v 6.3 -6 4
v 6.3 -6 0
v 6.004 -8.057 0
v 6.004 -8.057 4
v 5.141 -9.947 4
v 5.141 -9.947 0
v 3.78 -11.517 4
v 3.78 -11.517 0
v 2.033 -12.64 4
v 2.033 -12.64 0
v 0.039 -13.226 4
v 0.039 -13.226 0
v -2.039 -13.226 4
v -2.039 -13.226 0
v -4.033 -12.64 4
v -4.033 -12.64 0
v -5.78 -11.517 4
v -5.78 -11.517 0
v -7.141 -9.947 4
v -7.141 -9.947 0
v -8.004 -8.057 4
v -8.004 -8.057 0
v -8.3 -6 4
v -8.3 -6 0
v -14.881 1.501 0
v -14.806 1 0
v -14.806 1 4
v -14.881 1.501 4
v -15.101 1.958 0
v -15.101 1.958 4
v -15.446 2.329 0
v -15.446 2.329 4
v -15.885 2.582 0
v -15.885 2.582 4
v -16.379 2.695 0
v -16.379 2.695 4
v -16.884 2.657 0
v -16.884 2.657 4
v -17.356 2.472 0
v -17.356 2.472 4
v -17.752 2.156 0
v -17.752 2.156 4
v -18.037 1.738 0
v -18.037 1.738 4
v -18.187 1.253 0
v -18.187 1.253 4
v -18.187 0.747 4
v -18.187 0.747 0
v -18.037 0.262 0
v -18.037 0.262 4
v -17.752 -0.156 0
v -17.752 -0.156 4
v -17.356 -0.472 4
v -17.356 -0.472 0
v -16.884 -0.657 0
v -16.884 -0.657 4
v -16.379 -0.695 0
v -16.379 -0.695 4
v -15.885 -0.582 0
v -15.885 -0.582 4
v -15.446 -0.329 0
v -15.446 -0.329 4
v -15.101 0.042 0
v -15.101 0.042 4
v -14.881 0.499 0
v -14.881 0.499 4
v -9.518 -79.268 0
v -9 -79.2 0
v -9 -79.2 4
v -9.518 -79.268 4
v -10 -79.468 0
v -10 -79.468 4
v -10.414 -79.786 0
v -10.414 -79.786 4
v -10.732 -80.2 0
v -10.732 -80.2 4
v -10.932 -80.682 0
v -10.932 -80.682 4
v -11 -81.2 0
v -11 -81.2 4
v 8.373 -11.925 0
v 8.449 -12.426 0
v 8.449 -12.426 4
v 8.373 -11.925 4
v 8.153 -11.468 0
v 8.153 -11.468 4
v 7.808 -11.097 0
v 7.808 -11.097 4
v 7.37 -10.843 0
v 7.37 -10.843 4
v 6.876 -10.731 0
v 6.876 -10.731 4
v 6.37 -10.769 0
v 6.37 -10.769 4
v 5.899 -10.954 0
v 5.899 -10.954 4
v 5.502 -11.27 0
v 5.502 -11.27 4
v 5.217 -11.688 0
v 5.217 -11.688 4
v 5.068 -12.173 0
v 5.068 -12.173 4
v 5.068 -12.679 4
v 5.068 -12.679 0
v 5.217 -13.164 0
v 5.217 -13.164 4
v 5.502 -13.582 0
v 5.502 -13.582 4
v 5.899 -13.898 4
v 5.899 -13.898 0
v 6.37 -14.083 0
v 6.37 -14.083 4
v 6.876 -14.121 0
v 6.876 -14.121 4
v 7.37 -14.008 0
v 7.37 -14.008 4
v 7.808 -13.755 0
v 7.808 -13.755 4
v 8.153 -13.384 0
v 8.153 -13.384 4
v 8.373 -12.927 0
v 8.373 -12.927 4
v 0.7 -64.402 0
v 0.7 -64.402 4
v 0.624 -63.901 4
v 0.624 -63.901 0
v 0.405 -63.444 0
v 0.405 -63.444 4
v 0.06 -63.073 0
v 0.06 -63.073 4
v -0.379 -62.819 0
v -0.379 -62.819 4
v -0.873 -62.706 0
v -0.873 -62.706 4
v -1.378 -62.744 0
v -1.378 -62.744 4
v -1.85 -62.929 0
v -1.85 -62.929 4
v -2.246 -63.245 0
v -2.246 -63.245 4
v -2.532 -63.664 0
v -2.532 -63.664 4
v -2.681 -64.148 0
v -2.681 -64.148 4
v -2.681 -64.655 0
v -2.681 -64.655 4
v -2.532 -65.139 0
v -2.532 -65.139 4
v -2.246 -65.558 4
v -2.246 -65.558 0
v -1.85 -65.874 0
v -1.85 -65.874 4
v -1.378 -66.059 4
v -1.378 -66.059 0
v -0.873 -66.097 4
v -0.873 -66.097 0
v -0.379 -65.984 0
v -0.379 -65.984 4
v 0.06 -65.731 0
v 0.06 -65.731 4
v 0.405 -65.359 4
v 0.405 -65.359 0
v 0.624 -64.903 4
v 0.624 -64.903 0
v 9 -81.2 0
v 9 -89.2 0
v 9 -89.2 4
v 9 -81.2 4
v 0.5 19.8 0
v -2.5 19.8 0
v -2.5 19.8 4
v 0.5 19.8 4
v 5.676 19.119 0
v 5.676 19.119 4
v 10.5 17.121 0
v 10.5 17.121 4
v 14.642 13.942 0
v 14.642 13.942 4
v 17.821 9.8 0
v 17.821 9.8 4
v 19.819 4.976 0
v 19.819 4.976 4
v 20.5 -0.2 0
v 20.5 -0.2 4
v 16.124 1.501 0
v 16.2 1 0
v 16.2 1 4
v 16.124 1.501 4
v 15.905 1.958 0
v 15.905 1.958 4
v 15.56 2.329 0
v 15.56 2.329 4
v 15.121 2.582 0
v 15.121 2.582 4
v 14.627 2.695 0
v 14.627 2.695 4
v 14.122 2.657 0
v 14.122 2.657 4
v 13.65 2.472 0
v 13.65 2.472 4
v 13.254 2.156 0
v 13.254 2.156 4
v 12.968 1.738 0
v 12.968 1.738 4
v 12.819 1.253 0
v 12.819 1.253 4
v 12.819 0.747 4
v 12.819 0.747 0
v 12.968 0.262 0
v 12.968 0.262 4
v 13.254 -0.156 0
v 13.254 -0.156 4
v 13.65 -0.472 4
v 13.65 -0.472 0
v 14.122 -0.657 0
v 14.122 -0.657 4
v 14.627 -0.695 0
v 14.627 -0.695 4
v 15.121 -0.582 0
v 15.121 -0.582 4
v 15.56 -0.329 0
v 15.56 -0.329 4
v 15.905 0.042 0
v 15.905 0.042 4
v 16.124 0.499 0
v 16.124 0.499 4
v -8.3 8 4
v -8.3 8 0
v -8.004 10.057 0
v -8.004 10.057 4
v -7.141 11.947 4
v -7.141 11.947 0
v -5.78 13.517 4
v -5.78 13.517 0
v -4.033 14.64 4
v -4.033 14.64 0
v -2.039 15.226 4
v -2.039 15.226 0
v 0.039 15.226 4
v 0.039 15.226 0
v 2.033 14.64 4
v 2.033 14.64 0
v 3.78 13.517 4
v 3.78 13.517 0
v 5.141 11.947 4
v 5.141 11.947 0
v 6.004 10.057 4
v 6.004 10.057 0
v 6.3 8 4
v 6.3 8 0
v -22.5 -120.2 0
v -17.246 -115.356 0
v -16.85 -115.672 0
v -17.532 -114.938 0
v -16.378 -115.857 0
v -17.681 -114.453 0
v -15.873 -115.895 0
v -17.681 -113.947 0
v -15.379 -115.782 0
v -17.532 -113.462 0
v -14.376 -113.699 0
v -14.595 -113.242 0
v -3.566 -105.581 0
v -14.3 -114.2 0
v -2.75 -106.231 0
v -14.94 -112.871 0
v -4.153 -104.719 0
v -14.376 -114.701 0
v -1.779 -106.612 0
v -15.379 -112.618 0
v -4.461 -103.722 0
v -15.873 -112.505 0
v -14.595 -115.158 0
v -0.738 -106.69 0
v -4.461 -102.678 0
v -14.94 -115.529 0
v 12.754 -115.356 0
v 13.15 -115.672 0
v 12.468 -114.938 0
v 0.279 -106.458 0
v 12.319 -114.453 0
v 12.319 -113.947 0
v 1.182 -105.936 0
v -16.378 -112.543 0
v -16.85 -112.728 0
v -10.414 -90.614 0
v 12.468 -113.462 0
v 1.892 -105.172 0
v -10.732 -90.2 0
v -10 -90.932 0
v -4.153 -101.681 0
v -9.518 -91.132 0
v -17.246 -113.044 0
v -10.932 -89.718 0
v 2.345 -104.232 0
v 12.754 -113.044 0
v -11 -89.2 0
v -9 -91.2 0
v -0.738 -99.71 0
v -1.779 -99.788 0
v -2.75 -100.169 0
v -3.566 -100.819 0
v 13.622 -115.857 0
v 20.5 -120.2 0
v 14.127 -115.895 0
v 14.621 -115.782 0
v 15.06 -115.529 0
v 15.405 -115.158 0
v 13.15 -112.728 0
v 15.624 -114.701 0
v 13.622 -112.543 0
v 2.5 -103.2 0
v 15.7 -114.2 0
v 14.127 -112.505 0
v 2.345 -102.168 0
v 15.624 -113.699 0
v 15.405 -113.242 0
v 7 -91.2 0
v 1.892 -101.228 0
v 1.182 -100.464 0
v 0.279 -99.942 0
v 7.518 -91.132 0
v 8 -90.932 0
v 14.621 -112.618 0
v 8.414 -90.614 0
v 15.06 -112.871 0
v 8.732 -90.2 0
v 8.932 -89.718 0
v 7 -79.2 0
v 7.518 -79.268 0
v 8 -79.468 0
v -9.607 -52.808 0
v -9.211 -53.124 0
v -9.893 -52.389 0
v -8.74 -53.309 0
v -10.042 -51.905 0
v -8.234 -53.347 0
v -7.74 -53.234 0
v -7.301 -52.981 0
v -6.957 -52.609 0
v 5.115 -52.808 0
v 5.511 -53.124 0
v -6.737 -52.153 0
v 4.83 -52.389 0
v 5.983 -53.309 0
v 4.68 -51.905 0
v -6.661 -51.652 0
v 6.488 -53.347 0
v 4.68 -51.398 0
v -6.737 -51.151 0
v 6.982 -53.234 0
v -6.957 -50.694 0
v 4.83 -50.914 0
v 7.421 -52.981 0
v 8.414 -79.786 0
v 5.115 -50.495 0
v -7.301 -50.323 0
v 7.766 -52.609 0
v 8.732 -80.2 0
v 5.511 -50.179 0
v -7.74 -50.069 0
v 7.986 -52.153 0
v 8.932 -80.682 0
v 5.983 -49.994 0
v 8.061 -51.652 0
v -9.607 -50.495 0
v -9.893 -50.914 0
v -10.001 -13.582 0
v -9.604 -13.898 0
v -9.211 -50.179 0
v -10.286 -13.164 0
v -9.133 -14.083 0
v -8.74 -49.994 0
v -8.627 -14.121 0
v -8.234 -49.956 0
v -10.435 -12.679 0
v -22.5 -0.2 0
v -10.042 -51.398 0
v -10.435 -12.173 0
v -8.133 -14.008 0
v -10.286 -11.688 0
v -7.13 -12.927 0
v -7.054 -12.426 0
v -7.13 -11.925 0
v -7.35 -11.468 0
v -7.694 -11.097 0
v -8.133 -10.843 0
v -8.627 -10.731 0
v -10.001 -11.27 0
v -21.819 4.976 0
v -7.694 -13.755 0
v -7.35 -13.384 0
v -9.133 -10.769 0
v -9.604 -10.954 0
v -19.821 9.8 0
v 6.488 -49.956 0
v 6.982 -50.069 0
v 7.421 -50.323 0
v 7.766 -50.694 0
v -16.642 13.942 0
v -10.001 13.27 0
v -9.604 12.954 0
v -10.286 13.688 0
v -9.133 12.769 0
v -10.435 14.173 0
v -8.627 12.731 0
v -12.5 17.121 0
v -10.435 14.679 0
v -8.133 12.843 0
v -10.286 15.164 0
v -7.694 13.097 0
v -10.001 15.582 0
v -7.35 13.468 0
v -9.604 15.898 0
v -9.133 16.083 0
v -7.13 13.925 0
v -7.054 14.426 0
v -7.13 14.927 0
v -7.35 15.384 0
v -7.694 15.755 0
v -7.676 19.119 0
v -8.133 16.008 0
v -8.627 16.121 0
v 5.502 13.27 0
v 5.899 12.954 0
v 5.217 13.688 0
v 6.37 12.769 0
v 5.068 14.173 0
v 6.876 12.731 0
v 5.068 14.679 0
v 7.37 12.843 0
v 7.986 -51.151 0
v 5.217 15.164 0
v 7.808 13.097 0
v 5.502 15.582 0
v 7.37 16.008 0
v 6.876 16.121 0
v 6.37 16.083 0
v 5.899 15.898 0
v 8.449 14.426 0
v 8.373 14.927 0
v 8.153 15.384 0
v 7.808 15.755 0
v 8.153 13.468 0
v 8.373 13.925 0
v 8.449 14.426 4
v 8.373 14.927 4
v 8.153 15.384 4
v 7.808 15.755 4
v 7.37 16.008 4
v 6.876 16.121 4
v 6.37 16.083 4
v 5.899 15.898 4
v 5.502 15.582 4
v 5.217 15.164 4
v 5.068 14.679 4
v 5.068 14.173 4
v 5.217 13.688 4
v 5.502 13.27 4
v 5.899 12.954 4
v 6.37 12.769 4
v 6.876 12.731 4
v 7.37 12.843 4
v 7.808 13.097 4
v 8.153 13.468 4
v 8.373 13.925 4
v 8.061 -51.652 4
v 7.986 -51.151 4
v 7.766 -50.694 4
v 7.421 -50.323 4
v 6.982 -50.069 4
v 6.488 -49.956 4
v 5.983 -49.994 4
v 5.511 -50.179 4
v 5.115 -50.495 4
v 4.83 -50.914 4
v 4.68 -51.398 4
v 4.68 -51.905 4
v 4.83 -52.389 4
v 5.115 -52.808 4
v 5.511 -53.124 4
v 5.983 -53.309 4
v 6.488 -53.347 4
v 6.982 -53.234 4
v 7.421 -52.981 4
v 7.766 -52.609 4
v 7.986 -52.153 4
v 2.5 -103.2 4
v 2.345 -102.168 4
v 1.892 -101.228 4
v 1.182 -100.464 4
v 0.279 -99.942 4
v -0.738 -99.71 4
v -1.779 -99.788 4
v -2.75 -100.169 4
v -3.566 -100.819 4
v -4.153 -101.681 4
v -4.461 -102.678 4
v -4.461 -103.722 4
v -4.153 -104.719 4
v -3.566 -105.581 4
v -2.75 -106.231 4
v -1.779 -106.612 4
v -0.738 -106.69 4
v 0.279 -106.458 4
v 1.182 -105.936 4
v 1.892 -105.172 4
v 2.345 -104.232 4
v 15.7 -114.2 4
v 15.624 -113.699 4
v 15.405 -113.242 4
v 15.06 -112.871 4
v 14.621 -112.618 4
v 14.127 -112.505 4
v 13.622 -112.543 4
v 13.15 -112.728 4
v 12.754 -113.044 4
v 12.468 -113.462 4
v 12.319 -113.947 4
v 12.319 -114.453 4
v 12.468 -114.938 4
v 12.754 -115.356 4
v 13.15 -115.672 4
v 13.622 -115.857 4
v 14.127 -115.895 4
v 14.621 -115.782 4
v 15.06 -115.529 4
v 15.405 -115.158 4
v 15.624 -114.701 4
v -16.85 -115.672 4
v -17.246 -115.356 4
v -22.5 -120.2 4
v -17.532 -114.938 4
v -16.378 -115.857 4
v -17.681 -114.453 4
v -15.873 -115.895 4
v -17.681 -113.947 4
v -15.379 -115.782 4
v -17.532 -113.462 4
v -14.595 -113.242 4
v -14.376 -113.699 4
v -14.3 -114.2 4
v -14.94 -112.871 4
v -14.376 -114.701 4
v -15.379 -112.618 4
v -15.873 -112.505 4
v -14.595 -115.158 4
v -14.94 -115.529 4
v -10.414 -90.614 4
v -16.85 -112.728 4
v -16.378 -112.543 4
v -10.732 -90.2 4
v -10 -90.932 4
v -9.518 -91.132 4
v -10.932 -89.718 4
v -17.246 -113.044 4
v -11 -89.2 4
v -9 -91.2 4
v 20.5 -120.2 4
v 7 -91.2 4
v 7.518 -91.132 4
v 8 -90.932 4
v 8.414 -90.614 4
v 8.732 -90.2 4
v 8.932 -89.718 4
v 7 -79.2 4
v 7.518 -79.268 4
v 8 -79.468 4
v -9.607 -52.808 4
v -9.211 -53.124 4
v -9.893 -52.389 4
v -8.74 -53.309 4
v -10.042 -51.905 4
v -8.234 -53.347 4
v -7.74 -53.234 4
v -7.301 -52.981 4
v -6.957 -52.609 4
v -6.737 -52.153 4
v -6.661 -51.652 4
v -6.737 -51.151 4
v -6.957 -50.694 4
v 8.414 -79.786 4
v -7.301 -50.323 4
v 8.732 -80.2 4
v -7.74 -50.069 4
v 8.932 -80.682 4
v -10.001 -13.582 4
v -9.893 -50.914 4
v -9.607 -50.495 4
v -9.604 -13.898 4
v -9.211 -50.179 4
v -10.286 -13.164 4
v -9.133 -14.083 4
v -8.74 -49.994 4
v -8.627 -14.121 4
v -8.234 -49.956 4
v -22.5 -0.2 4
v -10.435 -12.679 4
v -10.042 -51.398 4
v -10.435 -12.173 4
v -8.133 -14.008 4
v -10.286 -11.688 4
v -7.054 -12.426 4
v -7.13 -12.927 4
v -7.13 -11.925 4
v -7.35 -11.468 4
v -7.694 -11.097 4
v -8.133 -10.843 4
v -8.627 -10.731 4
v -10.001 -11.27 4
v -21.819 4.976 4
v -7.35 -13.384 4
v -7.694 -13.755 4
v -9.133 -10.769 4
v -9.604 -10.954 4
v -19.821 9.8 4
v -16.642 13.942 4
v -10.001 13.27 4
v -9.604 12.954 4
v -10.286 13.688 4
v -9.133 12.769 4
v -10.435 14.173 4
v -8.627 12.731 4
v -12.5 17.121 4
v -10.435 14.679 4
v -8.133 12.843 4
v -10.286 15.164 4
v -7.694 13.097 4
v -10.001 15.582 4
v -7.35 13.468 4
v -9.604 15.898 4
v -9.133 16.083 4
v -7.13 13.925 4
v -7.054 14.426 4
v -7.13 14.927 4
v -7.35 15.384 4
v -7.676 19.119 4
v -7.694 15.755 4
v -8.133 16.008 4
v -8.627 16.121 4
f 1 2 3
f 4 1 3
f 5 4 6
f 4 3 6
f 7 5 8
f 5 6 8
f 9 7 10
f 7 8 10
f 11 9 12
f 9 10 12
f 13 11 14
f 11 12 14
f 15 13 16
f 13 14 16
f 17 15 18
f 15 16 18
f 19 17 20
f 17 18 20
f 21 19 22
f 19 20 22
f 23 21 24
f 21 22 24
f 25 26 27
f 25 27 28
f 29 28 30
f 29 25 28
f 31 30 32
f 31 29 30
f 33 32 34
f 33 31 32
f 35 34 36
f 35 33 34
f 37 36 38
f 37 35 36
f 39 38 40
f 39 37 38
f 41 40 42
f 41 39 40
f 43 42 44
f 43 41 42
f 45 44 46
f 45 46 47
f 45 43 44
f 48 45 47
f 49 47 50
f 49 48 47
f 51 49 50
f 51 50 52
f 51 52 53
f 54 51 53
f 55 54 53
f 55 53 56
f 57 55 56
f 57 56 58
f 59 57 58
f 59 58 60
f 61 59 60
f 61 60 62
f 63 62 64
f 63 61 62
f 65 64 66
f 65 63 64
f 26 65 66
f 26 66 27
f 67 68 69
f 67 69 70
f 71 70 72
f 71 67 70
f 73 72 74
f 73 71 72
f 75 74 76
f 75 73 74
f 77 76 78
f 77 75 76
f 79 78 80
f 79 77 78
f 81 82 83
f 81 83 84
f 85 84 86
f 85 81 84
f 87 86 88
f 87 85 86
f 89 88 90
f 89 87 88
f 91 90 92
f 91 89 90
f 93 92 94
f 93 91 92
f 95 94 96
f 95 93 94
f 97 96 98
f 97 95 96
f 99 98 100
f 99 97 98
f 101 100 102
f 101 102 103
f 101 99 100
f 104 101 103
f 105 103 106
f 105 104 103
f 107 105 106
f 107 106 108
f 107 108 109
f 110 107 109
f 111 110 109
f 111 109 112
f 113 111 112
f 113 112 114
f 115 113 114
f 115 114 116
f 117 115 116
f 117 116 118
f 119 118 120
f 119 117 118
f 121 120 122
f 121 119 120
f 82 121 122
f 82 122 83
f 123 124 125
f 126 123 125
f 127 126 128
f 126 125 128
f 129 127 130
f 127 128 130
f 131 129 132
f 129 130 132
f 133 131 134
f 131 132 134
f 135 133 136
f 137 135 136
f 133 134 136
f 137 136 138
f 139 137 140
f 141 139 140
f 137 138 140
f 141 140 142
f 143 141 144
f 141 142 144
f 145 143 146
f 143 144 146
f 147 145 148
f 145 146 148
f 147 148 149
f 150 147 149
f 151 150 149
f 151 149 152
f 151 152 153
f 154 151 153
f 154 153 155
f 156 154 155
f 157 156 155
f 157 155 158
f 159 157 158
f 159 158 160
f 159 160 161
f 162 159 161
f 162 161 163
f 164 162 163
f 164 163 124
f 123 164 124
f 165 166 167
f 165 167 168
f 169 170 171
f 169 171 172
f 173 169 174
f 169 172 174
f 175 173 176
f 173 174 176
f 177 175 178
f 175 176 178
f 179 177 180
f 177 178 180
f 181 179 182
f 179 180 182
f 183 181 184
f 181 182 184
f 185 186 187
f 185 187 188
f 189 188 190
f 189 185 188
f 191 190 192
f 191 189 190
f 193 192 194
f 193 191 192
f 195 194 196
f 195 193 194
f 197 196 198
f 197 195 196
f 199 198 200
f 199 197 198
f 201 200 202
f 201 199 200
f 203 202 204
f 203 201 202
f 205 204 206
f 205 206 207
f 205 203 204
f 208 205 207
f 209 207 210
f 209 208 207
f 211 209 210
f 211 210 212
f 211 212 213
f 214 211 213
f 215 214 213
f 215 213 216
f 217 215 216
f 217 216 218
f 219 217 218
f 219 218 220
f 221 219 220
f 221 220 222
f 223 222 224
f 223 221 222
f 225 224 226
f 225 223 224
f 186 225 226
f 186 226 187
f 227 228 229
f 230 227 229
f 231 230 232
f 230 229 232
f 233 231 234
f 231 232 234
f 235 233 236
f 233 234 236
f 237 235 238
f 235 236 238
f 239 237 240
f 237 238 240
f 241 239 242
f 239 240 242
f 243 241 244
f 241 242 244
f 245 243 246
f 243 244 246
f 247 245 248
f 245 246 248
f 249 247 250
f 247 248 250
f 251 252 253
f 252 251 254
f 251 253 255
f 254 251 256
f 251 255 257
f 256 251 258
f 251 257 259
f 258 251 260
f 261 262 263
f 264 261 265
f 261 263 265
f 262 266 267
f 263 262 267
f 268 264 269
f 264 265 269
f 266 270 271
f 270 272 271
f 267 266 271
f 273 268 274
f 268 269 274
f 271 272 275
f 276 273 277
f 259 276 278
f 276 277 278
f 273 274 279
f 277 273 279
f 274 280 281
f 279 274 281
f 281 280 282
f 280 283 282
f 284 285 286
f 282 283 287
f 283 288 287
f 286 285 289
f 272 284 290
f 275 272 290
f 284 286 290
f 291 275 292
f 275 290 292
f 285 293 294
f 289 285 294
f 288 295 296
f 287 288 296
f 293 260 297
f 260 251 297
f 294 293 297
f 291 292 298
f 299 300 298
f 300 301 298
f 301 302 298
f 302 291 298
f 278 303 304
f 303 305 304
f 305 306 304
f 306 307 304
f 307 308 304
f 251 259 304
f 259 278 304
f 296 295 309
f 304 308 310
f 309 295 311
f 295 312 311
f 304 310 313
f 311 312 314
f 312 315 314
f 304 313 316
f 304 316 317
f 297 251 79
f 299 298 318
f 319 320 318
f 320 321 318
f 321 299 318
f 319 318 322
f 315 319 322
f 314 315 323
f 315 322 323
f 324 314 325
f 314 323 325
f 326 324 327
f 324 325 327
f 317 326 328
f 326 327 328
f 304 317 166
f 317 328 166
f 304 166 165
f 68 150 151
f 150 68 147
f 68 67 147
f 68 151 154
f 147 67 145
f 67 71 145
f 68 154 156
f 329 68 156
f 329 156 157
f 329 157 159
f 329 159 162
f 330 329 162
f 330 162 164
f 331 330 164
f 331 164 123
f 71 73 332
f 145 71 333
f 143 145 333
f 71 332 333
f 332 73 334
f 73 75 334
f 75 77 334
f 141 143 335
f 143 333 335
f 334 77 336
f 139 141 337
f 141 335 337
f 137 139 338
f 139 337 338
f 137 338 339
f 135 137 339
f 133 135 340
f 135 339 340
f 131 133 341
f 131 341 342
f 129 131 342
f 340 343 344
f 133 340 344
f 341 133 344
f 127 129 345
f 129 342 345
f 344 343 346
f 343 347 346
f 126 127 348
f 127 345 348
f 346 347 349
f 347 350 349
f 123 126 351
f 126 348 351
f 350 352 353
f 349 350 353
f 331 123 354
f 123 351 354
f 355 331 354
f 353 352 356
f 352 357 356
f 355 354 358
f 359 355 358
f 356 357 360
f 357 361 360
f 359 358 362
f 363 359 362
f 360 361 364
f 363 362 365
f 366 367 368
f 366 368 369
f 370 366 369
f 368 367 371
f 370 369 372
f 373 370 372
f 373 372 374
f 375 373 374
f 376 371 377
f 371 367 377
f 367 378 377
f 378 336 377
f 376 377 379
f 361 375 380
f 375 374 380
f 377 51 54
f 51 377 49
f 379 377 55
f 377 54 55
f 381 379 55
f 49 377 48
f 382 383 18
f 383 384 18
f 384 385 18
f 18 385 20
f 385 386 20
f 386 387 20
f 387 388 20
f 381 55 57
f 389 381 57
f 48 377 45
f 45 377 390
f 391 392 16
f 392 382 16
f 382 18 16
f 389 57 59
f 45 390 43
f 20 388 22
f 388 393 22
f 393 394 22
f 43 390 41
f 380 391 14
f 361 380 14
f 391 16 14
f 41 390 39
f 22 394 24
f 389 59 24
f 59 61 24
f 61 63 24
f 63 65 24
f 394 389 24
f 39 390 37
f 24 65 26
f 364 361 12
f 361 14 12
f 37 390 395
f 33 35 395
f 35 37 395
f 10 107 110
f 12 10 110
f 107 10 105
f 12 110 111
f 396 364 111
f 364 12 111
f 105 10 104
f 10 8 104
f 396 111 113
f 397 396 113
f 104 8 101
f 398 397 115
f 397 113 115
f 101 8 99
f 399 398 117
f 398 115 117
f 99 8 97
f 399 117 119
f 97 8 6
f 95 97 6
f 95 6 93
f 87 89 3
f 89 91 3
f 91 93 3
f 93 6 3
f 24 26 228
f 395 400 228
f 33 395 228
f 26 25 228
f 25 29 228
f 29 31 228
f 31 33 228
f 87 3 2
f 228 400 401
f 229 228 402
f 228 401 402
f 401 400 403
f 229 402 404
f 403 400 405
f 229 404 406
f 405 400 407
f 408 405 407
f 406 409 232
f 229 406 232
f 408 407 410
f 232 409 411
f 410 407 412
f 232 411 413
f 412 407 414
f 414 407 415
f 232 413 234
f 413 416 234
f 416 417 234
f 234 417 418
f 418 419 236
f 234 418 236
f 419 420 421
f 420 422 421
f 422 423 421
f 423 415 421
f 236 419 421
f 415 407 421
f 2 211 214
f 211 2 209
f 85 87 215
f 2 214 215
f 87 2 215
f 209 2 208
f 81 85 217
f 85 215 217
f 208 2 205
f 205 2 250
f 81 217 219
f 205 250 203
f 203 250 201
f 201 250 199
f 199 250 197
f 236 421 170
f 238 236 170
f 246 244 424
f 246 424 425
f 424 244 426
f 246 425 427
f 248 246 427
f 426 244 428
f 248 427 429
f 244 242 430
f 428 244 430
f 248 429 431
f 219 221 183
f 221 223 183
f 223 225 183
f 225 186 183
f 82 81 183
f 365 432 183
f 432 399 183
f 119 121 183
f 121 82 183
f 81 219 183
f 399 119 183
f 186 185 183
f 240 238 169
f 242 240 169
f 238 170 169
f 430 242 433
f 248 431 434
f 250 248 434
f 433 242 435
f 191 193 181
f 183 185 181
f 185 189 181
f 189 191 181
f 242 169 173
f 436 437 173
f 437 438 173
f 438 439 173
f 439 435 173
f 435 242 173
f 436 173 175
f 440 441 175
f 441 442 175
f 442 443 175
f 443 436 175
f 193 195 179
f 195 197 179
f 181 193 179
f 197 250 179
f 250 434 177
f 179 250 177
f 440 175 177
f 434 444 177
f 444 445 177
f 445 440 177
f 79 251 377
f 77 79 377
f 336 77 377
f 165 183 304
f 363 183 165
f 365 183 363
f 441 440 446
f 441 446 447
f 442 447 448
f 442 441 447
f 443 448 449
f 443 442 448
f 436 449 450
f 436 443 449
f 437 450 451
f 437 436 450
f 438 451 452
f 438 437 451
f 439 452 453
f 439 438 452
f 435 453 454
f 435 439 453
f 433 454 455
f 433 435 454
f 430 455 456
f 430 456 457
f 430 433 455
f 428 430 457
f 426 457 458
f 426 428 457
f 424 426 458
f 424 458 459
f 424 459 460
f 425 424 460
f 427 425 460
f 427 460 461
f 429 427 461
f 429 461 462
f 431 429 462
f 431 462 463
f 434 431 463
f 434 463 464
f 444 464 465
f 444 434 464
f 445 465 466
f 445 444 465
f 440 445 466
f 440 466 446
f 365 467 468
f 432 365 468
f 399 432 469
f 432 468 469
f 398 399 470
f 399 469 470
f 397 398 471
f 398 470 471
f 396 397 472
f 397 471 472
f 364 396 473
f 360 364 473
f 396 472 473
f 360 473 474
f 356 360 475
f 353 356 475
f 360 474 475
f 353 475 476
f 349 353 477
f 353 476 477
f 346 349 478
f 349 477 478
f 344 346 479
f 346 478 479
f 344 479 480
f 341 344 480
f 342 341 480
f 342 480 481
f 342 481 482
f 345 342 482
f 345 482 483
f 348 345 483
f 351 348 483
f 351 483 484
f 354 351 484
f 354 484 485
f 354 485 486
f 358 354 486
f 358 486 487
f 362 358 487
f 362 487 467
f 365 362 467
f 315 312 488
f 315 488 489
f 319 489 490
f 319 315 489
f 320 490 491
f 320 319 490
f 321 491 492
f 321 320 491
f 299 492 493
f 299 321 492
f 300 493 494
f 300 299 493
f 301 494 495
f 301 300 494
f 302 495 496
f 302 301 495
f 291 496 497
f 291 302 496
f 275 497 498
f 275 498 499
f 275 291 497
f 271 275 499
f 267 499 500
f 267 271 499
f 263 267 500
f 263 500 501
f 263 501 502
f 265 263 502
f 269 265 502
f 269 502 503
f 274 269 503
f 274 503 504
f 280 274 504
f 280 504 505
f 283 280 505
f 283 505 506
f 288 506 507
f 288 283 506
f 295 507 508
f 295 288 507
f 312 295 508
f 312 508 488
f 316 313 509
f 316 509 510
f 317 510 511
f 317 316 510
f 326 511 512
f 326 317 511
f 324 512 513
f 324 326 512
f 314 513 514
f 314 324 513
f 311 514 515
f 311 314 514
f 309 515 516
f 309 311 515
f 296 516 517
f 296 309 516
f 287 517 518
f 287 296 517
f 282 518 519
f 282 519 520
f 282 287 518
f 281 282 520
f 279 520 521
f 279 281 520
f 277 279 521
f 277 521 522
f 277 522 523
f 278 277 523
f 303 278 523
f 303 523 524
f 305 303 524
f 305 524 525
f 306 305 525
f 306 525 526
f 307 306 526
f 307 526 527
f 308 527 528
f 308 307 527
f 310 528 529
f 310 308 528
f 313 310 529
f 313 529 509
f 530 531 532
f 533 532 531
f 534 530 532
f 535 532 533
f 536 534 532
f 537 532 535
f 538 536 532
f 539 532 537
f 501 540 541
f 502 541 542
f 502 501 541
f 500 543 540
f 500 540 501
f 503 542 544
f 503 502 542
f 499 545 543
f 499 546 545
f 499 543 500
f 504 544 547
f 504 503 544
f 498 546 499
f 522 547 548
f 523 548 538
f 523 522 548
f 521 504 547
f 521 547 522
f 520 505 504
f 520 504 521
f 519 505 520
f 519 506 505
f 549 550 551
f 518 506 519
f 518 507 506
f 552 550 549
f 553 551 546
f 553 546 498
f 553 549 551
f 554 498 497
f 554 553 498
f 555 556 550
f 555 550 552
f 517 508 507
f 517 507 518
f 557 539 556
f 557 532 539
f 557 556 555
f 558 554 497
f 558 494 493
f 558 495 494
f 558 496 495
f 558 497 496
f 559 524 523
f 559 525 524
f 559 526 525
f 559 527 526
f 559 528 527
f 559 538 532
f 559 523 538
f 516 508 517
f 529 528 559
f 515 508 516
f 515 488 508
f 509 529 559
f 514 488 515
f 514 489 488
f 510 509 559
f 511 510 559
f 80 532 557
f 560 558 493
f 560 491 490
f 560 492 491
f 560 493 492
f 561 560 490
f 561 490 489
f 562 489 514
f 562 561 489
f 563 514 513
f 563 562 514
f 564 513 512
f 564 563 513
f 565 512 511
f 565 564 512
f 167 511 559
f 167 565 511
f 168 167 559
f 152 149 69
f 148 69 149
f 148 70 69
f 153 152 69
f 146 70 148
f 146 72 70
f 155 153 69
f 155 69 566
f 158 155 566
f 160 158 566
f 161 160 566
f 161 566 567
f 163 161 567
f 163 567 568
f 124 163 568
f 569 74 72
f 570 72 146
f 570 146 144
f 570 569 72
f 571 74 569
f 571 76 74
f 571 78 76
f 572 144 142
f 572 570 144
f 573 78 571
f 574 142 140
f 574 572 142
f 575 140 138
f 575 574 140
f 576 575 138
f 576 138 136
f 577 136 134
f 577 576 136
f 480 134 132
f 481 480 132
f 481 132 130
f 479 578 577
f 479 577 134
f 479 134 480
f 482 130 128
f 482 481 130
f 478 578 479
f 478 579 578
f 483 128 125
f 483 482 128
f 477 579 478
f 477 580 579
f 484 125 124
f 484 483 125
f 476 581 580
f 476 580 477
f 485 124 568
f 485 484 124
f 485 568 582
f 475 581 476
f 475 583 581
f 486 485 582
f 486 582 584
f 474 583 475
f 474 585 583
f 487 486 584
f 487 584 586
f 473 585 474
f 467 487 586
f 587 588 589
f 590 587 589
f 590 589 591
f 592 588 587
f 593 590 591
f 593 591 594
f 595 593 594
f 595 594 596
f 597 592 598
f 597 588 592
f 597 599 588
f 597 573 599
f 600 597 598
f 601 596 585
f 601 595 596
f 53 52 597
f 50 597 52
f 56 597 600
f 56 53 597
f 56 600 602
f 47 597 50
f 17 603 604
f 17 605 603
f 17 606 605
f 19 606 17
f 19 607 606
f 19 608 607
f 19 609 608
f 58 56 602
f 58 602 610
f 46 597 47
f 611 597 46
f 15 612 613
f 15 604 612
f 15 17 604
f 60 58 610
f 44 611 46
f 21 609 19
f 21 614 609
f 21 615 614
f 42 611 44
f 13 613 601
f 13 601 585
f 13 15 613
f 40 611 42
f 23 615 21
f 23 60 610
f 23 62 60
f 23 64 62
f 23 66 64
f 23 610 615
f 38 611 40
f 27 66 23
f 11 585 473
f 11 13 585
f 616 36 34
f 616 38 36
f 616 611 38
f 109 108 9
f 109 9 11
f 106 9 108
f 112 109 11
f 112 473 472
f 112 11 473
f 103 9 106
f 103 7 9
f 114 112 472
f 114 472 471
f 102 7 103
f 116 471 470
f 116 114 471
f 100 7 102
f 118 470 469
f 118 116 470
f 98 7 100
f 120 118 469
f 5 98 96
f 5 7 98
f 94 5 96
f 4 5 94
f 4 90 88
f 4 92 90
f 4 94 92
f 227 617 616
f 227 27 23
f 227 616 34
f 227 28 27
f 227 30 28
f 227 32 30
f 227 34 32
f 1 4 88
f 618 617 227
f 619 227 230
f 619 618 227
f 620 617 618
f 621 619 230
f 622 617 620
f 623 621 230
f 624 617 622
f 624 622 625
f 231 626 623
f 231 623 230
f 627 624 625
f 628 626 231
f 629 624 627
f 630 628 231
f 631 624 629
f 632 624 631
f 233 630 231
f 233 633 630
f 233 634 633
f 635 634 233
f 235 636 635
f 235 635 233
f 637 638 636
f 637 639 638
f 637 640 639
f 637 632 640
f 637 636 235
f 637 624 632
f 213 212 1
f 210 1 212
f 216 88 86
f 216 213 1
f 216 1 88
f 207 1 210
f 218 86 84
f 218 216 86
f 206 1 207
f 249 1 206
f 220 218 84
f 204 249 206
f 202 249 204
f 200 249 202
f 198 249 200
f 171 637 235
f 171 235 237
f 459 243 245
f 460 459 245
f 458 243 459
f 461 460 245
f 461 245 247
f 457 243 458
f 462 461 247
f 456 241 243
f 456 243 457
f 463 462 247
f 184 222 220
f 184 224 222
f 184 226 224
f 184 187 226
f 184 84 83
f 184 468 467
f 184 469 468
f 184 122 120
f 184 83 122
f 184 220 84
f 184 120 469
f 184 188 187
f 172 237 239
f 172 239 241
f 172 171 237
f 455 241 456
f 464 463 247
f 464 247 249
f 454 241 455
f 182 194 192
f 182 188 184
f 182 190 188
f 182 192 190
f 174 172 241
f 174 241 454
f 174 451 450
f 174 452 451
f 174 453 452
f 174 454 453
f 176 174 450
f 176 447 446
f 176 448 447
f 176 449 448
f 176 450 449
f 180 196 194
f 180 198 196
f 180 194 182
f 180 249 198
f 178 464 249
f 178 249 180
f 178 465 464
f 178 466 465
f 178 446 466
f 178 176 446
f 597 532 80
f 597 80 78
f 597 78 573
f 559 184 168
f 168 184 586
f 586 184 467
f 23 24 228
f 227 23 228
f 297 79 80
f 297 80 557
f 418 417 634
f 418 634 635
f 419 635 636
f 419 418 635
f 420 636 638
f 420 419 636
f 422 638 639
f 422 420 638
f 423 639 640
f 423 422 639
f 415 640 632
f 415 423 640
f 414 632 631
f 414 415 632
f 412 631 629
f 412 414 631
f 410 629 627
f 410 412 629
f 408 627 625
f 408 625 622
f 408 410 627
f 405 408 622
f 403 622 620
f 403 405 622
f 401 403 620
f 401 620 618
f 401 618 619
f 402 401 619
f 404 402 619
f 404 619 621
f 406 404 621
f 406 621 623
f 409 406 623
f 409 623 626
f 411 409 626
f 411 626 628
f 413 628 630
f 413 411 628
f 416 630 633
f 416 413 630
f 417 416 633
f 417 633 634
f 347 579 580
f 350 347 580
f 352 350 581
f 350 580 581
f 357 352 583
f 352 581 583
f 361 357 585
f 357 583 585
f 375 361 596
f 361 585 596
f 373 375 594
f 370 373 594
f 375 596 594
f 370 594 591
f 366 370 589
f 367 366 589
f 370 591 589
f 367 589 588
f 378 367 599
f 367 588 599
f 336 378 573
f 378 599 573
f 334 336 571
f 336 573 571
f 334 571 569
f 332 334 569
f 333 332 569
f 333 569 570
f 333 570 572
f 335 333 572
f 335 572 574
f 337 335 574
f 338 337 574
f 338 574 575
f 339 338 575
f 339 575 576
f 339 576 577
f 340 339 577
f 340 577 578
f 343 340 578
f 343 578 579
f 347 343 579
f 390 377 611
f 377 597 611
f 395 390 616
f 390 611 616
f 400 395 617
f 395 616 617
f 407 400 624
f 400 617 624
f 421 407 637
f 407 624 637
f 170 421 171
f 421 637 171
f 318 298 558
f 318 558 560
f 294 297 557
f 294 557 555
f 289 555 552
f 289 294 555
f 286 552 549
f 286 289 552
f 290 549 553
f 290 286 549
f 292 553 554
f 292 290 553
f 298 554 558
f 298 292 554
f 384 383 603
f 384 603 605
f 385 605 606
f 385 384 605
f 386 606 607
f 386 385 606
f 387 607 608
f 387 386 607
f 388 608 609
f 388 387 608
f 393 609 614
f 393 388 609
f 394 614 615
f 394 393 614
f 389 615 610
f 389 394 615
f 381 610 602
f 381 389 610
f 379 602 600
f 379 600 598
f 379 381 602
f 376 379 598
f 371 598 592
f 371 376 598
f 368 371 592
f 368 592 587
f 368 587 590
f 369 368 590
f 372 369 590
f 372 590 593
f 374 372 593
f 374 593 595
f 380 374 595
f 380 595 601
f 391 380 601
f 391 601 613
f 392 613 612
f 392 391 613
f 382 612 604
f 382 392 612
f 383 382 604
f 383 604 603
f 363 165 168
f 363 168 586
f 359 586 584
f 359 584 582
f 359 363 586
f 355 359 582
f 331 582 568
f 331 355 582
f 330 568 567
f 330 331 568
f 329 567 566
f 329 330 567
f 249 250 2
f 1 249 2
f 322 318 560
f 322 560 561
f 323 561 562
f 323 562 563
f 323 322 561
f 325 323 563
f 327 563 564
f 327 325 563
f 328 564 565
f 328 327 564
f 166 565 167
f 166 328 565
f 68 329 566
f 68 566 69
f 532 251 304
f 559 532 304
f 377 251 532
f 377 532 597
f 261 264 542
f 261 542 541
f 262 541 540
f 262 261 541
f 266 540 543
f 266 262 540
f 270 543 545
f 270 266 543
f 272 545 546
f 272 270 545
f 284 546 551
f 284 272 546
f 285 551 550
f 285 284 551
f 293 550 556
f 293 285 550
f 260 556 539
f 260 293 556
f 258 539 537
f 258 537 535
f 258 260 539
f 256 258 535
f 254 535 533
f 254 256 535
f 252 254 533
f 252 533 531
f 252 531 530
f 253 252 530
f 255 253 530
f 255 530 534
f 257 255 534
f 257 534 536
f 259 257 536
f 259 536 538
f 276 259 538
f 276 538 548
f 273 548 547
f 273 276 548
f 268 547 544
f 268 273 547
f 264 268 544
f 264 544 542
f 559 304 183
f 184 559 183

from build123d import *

# Parameters (mm, degrees)
SKETCH1_W           = 43
SKETCH1_H           = 140
SKETCH1_R           = 1.7
SKETCH1_R_2         = 3.5
BOSS_EXTRUDE1_DEPTH = 4
FILLET1_R           = 20
SKETCH2_R           = 1.7
DEPENDANT_DEPTH     = 10


with BuildPart() as part:
    # Sketch1 → Boss-Extrude1 (new body)
    with BuildSketch(Plane.XY):
        with Locations((-1, -50.2)):
            Rectangle(SKETCH1_W, SKETCH1_H)
        with Locations((6.748548523, -12.425907791)):
            Circle(SKETCH1_R, mode=Mode.SUBTRACT)
        with Locations((-8.754354431, -12.425907791)):
            Circle(SKETCH1_R, mode=Mode.SUBTRACT)
        with Locations((-16.505805908, 1)):
            Circle(SKETCH1_R, mode=Mode.SUBTRACT)
        with Locations((-8.754354431, 14.425907791)):
            Circle(SKETCH1_R, mode=Mode.SUBTRACT)
        with Locations((6.748548523, 14.425907791)):
            Circle(SKETCH1_R, mode=Mode.SUBTRACT)
        with Locations((14.5, 1)):
            Circle(SKETCH1_R, mode=Mode.SUBTRACT)
        with Locations((14, -114.2)):
            Circle(SKETCH1_R, mode=Mode.SUBTRACT)
        with Locations((-16, -114.2)):
            Circle(SKETCH1_R, mode=Mode.SUBTRACT)
        with Locations((-1, -103.2)):
            Circle(SKETCH1_R_2, mode=Mode.SUBTRACT)
        with BuildLine():
            Line((6.3, 8), (6.3, -6))
            ThreePointArc((6.3, -6), (-1, -13.3), (-8.3, -6))
            Line((-8.3, -6), (-8.3, 8))
            ThreePointArc((-8.3, 8), (-1, 15.3), (6.3, 8))
        make_face(mode=Mode.SUBTRACT)
        with BuildLine():
            Line((-9, -91.2), (7, -91.2))
            ThreePointArc((7, -91.2), (8.414213562, -90.614213562), (9, -89.2))
            Line((9, -89.2), (9, -81.2))
            ThreePointArc((9, -81.2), (8.414213562, -79.785786438), (7, -79.2))
            Line((7, -79.2), (-9, -79.2))
            ThreePointArc((-9, -79.2), (-10.414213562, -79.785786438), (-11, -81.2))
            Line((-11, -81.2), (-11, -89.2))
            ThreePointArc((-11, -89.2), (-10.414213562, -90.614213562), (-9, -91.2))
        make_face(mode=Mode.SUBTRACT)
    extrude(amount=BOSS_EXTRUDE1_DEPTH)

    # Fillet1
    fillet1_edges = [part.edges().sort_by_distance(p)[0] for p in [
        (-22.5, 19.8, 2),
        (20.5, 19.8, 2),
    ]]
    fillet(fillet1_edges, radius=FILLET1_R)

    # Sketch2 → dependant (cut)
    with BuildSketch(Plane.XY.offset(4)):
        with Locations((-1, -64.401659044)):
            Circle(SKETCH2_R)
        with Locations((6.361215932, -51.651659044)):
            Circle(SKETCH2_R)
        with Locations((-8.361215932, -51.651659044)):
            Circle(SKETCH2_R)
    extrude(amount=-DEPENDANT_DEPTH, mode=Mode.SUBTRACT)


solid = part.part
